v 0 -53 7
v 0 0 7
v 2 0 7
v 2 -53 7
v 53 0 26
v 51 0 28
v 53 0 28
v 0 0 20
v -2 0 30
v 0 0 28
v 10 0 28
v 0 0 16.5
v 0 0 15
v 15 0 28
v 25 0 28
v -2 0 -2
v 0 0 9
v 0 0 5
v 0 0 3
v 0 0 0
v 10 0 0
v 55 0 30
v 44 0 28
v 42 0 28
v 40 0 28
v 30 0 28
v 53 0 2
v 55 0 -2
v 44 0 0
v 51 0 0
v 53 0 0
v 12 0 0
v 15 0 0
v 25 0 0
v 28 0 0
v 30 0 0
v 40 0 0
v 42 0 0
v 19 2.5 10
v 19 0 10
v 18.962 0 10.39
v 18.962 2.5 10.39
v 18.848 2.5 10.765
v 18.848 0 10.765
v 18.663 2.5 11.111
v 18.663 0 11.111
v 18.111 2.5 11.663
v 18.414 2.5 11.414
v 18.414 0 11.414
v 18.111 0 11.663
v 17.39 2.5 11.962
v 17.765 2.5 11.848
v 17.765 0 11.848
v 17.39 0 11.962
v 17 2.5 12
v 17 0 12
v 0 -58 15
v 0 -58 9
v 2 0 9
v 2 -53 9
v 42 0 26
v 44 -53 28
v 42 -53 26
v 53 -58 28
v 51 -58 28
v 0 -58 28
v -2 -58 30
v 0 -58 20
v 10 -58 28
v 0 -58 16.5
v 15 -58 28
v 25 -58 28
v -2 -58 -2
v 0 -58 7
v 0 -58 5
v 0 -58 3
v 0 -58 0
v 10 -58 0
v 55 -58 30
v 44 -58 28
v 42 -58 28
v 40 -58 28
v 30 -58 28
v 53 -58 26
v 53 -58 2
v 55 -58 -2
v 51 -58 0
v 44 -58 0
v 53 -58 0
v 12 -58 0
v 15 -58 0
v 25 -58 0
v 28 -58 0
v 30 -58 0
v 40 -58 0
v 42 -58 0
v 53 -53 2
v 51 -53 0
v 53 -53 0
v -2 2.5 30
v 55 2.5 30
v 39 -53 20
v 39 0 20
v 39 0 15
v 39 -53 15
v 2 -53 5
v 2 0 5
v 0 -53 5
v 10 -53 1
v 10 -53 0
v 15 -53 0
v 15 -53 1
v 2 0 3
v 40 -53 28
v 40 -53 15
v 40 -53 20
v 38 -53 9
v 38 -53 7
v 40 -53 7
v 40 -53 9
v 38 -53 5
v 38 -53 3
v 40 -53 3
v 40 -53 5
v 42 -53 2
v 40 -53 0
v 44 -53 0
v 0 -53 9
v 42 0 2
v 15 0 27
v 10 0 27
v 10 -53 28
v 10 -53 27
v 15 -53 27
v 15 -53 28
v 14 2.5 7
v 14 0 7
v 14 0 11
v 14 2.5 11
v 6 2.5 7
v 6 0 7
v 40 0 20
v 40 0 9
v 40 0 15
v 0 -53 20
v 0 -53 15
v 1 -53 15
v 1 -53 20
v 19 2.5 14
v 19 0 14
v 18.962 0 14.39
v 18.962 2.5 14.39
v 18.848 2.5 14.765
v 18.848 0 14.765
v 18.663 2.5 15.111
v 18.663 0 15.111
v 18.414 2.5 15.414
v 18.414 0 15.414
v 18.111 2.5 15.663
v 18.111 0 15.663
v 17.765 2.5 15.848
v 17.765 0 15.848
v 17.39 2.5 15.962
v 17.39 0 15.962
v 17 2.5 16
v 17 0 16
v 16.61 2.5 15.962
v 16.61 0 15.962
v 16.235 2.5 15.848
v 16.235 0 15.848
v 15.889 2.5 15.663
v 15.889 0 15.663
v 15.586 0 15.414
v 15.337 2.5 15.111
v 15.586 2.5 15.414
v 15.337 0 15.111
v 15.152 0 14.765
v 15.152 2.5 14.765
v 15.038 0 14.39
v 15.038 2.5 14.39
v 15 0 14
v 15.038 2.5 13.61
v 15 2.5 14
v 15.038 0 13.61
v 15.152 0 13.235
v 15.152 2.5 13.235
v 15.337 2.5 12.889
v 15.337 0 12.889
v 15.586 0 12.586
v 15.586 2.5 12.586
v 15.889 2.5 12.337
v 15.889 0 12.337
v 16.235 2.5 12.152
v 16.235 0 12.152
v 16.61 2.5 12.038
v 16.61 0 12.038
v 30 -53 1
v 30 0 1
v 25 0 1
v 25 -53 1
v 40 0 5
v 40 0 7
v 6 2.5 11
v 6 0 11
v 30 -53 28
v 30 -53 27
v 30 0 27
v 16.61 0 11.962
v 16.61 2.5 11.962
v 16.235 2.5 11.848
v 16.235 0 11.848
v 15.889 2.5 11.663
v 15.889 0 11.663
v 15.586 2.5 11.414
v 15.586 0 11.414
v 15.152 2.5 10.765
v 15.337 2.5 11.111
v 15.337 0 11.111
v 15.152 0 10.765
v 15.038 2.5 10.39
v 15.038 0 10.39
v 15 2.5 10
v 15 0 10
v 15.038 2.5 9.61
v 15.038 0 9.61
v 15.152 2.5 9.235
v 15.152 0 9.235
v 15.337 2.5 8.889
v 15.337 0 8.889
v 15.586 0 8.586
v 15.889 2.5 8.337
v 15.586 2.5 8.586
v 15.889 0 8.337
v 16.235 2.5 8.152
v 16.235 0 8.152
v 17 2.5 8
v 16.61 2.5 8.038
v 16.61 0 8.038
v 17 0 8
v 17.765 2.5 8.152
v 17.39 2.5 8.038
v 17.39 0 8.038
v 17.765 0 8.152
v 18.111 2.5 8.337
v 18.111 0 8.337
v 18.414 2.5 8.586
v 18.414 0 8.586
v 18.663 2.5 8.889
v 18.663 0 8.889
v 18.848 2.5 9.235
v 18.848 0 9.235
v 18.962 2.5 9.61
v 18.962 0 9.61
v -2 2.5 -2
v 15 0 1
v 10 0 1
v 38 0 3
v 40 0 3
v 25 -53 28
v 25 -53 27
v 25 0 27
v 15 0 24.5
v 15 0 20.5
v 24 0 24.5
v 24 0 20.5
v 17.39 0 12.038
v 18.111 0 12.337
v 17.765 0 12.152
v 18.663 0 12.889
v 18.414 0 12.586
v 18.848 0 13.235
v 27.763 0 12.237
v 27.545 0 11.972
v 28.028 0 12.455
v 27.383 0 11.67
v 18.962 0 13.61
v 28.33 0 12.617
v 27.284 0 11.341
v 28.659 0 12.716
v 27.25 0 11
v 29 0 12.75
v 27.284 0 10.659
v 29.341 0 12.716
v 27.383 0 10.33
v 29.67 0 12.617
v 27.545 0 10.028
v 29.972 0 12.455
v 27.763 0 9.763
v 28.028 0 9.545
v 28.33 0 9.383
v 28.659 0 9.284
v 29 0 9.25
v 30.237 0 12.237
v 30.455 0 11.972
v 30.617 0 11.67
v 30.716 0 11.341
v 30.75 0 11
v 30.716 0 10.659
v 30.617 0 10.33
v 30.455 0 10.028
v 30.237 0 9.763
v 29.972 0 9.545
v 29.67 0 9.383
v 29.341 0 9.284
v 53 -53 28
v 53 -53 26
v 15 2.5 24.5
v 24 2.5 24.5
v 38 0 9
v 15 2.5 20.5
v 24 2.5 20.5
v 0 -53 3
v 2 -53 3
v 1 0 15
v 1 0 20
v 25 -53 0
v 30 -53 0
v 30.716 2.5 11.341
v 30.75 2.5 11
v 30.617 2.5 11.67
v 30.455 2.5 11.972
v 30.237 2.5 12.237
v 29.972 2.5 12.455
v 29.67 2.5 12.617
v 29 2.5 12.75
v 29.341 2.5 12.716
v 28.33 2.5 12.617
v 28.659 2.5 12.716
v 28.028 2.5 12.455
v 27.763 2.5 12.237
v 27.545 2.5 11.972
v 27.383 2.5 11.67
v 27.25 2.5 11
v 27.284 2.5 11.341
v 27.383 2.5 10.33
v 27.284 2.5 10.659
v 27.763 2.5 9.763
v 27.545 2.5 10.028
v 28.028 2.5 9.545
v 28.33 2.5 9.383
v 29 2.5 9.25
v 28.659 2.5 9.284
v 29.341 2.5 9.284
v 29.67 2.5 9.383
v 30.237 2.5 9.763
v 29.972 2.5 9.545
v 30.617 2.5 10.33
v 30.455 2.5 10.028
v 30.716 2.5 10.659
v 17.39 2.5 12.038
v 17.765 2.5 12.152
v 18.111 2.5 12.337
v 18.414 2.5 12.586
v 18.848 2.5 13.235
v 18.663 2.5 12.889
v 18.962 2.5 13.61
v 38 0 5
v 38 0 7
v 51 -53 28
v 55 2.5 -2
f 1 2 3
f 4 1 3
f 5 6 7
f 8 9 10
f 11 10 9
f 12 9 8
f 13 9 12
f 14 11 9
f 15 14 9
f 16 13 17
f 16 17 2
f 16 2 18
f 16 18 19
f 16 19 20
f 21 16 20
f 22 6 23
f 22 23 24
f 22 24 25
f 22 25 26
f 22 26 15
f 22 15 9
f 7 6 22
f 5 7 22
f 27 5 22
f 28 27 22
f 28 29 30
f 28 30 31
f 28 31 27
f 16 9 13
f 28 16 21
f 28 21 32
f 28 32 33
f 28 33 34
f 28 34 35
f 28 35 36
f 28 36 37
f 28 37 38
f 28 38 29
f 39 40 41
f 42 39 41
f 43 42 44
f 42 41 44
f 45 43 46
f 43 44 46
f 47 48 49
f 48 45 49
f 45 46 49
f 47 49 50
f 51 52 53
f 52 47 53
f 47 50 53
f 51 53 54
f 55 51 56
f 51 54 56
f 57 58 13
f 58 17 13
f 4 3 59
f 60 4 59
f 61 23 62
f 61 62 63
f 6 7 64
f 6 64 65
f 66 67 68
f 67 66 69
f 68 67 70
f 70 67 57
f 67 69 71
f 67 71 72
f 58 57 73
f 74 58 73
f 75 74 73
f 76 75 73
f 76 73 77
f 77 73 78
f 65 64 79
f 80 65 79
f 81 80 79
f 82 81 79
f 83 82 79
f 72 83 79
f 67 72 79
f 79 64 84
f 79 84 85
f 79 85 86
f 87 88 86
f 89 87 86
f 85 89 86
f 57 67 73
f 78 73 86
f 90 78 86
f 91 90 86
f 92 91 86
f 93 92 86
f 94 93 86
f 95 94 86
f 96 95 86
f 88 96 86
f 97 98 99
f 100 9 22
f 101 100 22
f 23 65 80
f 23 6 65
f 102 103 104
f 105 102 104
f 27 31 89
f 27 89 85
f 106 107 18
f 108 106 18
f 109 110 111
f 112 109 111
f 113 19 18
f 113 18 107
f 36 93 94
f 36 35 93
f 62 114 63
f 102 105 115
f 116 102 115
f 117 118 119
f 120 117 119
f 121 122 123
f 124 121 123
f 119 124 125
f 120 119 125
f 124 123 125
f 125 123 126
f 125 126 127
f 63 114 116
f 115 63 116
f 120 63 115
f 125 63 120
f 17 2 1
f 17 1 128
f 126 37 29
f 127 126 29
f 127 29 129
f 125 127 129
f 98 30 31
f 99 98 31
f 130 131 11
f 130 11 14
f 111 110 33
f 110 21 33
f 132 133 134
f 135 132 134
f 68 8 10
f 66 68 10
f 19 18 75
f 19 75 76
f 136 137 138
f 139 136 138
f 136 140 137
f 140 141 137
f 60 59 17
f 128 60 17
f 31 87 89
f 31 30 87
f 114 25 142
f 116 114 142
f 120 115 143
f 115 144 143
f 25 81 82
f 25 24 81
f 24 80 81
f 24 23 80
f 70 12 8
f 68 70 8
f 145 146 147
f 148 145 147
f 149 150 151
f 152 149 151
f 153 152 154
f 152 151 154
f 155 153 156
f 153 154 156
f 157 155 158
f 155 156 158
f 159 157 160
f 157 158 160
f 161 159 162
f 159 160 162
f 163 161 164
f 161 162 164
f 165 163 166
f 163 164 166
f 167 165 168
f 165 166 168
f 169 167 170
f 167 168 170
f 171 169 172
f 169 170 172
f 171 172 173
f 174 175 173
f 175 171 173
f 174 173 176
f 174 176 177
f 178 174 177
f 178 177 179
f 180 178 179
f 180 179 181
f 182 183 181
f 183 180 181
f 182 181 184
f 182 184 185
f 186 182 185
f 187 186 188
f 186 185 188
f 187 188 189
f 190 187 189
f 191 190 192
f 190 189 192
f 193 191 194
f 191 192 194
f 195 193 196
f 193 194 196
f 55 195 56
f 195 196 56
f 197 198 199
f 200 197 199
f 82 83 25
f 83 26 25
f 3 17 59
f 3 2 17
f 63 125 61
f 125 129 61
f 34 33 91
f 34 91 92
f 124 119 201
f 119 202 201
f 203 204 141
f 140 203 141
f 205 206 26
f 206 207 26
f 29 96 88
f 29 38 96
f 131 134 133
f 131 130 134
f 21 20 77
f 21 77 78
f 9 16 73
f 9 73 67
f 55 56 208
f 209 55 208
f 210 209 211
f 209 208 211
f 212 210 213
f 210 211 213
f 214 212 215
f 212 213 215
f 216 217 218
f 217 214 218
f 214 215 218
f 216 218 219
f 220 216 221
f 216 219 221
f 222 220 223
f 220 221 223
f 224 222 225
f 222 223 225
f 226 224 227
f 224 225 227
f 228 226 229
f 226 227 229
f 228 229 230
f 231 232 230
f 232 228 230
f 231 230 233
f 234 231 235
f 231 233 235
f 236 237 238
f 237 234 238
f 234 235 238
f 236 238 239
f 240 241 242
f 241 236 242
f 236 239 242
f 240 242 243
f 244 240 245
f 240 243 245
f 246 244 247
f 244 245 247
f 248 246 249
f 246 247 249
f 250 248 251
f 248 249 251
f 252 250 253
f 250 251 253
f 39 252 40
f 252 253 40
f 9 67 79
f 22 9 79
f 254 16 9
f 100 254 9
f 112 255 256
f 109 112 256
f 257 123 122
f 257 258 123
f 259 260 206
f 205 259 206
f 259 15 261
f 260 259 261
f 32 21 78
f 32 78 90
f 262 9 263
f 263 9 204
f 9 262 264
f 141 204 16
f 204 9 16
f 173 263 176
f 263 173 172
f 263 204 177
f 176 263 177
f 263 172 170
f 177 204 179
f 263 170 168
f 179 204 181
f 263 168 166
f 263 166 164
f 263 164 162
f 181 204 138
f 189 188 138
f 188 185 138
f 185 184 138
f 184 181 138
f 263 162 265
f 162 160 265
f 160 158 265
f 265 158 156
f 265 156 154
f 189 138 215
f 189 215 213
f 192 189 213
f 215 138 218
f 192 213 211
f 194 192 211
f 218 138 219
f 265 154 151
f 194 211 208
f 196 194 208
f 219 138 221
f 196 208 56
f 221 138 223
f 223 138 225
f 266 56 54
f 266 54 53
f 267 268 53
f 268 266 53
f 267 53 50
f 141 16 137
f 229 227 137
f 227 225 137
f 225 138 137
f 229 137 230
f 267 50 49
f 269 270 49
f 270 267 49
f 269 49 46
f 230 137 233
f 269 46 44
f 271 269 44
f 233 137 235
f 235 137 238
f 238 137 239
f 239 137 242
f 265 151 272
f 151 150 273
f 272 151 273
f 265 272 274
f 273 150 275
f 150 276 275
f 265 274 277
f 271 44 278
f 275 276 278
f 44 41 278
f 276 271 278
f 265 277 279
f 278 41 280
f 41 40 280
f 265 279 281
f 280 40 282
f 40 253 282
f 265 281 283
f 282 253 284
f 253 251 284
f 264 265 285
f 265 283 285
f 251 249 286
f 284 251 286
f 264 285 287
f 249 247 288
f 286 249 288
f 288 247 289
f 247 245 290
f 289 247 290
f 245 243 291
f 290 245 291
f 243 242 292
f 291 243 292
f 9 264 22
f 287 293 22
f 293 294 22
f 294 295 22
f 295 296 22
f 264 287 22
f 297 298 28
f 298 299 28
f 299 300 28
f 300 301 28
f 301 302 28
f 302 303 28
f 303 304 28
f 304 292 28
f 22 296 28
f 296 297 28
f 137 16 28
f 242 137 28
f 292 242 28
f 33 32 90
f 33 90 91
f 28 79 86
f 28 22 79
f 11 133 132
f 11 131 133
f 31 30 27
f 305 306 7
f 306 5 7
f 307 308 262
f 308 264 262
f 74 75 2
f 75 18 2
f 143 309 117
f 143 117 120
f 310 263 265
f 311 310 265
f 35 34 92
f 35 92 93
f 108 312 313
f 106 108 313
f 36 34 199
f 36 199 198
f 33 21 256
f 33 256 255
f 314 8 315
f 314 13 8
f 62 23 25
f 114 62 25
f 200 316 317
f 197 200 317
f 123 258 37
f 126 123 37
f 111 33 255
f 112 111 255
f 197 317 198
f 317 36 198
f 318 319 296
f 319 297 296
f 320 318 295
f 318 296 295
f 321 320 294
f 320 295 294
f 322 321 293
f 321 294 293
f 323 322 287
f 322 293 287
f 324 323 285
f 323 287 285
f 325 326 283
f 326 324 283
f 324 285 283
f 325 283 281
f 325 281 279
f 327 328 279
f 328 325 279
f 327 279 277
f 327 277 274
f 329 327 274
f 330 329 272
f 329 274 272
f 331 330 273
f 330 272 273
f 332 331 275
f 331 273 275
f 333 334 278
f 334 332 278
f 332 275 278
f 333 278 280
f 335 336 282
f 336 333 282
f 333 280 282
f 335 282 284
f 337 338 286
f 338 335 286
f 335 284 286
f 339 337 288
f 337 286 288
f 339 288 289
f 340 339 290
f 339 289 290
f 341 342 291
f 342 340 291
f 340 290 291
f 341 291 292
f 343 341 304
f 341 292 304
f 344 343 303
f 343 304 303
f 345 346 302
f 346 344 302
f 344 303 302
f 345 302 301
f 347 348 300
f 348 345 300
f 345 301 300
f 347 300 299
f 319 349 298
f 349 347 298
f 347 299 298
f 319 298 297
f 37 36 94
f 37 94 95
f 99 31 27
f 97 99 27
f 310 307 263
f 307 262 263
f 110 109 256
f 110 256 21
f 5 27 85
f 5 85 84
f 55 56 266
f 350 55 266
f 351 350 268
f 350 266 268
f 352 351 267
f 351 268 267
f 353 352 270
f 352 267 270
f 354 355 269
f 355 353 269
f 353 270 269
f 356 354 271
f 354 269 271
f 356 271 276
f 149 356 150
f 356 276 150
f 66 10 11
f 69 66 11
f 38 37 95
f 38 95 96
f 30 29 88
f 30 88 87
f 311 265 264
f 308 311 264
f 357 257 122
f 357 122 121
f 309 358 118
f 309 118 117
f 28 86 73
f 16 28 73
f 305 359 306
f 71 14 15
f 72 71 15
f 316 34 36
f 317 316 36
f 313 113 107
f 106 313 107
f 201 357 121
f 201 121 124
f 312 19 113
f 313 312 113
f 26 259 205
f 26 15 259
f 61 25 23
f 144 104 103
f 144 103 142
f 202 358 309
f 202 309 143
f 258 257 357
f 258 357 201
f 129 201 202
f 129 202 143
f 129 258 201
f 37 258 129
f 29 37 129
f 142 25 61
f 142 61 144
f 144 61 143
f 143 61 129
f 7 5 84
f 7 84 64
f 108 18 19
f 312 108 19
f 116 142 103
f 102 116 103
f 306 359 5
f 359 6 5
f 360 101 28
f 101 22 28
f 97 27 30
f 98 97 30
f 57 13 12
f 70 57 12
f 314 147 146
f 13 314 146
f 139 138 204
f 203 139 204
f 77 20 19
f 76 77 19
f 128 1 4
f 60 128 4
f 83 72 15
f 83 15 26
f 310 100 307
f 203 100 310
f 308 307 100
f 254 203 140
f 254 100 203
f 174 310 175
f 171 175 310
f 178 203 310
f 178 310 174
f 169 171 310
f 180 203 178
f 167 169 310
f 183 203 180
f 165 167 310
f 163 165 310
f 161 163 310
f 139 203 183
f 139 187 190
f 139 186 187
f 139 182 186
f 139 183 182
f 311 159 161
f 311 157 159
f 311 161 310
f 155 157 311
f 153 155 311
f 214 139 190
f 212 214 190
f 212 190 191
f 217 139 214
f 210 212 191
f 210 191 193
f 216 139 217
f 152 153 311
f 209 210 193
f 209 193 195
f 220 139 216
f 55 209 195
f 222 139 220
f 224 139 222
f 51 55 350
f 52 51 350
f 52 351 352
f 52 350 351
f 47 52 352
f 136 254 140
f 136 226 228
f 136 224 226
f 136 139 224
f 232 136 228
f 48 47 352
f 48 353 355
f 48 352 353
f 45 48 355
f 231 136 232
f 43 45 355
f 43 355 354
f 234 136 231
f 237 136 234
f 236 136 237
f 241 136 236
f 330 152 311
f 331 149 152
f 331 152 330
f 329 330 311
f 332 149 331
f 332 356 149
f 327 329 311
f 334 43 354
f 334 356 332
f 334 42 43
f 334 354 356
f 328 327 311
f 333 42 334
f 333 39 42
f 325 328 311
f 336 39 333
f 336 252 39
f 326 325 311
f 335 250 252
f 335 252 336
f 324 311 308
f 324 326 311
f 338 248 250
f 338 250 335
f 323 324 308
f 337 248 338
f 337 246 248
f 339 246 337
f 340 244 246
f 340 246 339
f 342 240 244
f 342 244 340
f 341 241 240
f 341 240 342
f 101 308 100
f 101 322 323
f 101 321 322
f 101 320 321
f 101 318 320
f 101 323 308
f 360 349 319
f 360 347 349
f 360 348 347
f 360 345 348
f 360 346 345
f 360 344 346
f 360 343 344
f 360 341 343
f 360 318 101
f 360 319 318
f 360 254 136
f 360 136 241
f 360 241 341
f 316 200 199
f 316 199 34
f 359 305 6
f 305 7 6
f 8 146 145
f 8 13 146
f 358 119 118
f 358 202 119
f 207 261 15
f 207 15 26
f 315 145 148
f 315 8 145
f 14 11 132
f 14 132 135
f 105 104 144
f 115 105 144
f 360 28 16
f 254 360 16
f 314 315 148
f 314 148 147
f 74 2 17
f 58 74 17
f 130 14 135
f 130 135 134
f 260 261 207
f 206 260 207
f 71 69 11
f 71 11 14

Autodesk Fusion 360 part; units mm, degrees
sketch "Esquisse1" plane through (0, 0, 0) normal (0, 1, 0) x (1, 0, 0)
  line L0 (0, -28) -> (40, -28)
  line L1 (40, -28) -> (40, 0)
  line L2 (40, 0) -> (42, 0)
  line L3 (42, 0) -> (42, -28)
  line L4 (42, -28) -> (40, -28)
  line L5 (40, -28) -> (40, 0)
  line L6 (42, 0) -> (53, 0)
  line L7 (53, 0) -> (53, -28)
  line L8 (53, -28) -> (42, -28)
  line L9 (42, -28) -> (42, 0)
  line L10 (12, 0) -> (15, 0)
  line L11 (25, 0) -> (28, 0)
  line L12 (10, -28) -> (15, -28)
  line L13 (15, -28) -> (15, -27)
  line L14 (15, -27) -> (10, -27)
  line L15 (10, -27) -> (10, -28)
  line L16 (30, -28) -> (25, -28)
  line L17 (25, -28) -> (25, -27)
  line L18 (25, -27) -> (30, -27)
  line L19 (30, -27) -> (30, -28)
  line L20 (0, -3) -> (2, -3)
  line L21 (2, -3) -> (2, -5)
  line L22 (2, -5) -> (0, -5)
  line L23 (0, -5) -> (0, -3)
  line L24 (40, -3) -> (38, -3)
  line L25 (38, -3) -> (38, -5)
  line L26 (38, -5) -> (40, -5)
  line L27 (40, -5) -> (40, -3)
  line L28 (40, -7) -> (38, -7)
  line L29 (38, -7) -> (38, -9)
  line L30 (38, -9) -> (40, -9)
  line L31 (40, -9) -> (40, -7)
  line L32 (6, -7) -> (14, -7)
  line L33 (14, -7) -> (14, -11)
  line L34 (14, -11) -> (6, -11)
  line L35 (6, -11) -> (6, -7)
  circle A0 centre (29, -11) radius 1.75
  circle A1 centre (17, -10) radius 2
  circle A2 centre (17, -14) radius 2
  line L36 (0, 0) -> (40, 0)
  line L37 (0, 0) -> (0, -28)
  line L38 (0, -7) -> (2, -7)
  line L39 (2, -7) -> (2, -9)
  line L40 (2, -9) -> (0, -9)
  line L41 (0, -9) -> (0, -7)
  line L42 (-2, -30) -> (55, -30)
  line L43 (55, -30) -> (55, 2)
  line L44 (55, 2) -> (-2, 2)
  line L45 (-2, 2) -> (-2, -30)
  line L46 (0, 0) -> (15, 0)
  line L47 (0, -16.5) -> (0, 0)
  line L48 (15, -20.5) -> (24, -20.5)
  line L49 (24, -20.5) -> (24, -24.5)
  line L50 (24, -24.5) -> (15, -24.5)
  line L51 (15, -24.5) -> (15, -20.5)
  line L52 (0, -20) -> (1, -20)
  line L53 (1, -20) -> (1, -15)
  line L54 (1, -15) -> (0, -15)
  line L55 (0, -15) -> (0, -20)
  line L56 (40, -16) -> (40, -20)
  line L57 (44, -28) -> (42, -26)
  line L58 (51, -28) -> (53, -26)
  line L59 (53, -2) -> (51, 0)
  line L60 (44, 0) -> (42, -2)
  line L61 (10, 0) -> (15, 0)
  line L62 (15, 0) -> (15, -1)
  line L63 (15, -1) -> (10, -1)
  line L64 (10, -1) -> (10, 0)
  line L65 (25, 0) -> (30, 0)
  line L66 (30, 0) -> (30, -1)
  line L67 (30, -1) -> (25, -1)
  line L68 (25, -1) -> (25, 0)
  line L69 (40, -20) -> (39, -20)
  line L70 (39, -20) -> (39, -15)
  line L71 (39, -15) -> (40, -15)
  line L72 (40, -15) -> (40, -20)
  dimension "d42" = 28
  dimension "d43" = 32
  dimension "d44" = 40
  dimension "d45" = 2
  dimension "d46" = 11
  dimension "d47" = 57
extrude "Extrusion4" add sketch "Esquisse1" along normal blind 2.5 contours L0 L1 L5 L13 L14 L15 L17 L18 L19 L20 L21 L22 L24 L25 L26 L28 L29 L30 L36 L37 L38 L39 L40 L46 L47 L52 L53 L54 L62 L63 L64 L66 L67 L68 L69 L70 L71 | L0 L12 L13 L14 L15 | L37 L47 L52 L53 L54 L55 | L0 L16 L17 L18 L19 | L37 L38 L39 L40 L41 L47 | L1 L2 L3 L4 L5 L9 L27 L31 L56 L72 | L1 L5 L56 L69 L70 L71 L72 | L3 L8 L9 L57 | L20 L21 L22 L23 L37 L47 | L3 L6 L7 L8 L9 L57 L58 L59 L60 | L3 L6 L9 L60 | L7 L8 L58 | L1 L5 L28 L29 L30 L31 | L10 L36 L46 L61 L62 L63 L64 | L6 L7 L59 | L1 L5 L24 L25 L26 L27 | L11 L36 L65 L66 L67 L68 | L42 L43 L44 L45 makes body 1
extrude "Extrusion5" add sketch "Esquisse1" against normal blind 58 separate body contours L42 L43 L44 L45 makes body 2
extrude "Extrusion6" add sketch "Esquisse1" against normal blind 53 separate body contours L0 L12 L13 L14 L15 | L37 L47 L52 L53 L54 L55 | L0 L16 L17 L18 L19 | L37 L38 L39 L40 L41 L47 | L1 L2 L3 L4 L5 L9 L27 L31 L56 L72 | L1 L5 L56 L69 L70 L71 L72 | L3 L8 L9 L57 | L20 L21 L22 L23 L37 L47 | L3 L6 L9 L60 | L7 L8 L58 | L1 L5 L28 L29 L30 L31 | L10 L36 L46 L61 L62 L63 L64 | L6 L7 L59 | L1 L5 L24 L25 L26 L27 | L11 L36 L65 L66 L67 L68 makes body 3 at (42, -35.3333, 18) makes body 4 at (28.3333, -17.6667, 1) makes body 5 at (0, -17.6667, 16.6667) makes body 6 at (11.6667, -17.6667, 0) makes body 7 at (51.6667, -35.3333, 27.3333) makes body 8 at (0, -17.6667, 7.6667) makes body 9 at (26.6667, -17.6667, 27) makes body 10 at (13.3333, -17.6667, 27) makes body 11 at (0, -17.6667, 4.3333) makes body 12 at (52.3333, -17.6667, 1.3333)
extrude "Extrusion1" [suppressed]
extrude "Extrusion2" [suppressed]
extrude "Extrusion3" [suppressed]
